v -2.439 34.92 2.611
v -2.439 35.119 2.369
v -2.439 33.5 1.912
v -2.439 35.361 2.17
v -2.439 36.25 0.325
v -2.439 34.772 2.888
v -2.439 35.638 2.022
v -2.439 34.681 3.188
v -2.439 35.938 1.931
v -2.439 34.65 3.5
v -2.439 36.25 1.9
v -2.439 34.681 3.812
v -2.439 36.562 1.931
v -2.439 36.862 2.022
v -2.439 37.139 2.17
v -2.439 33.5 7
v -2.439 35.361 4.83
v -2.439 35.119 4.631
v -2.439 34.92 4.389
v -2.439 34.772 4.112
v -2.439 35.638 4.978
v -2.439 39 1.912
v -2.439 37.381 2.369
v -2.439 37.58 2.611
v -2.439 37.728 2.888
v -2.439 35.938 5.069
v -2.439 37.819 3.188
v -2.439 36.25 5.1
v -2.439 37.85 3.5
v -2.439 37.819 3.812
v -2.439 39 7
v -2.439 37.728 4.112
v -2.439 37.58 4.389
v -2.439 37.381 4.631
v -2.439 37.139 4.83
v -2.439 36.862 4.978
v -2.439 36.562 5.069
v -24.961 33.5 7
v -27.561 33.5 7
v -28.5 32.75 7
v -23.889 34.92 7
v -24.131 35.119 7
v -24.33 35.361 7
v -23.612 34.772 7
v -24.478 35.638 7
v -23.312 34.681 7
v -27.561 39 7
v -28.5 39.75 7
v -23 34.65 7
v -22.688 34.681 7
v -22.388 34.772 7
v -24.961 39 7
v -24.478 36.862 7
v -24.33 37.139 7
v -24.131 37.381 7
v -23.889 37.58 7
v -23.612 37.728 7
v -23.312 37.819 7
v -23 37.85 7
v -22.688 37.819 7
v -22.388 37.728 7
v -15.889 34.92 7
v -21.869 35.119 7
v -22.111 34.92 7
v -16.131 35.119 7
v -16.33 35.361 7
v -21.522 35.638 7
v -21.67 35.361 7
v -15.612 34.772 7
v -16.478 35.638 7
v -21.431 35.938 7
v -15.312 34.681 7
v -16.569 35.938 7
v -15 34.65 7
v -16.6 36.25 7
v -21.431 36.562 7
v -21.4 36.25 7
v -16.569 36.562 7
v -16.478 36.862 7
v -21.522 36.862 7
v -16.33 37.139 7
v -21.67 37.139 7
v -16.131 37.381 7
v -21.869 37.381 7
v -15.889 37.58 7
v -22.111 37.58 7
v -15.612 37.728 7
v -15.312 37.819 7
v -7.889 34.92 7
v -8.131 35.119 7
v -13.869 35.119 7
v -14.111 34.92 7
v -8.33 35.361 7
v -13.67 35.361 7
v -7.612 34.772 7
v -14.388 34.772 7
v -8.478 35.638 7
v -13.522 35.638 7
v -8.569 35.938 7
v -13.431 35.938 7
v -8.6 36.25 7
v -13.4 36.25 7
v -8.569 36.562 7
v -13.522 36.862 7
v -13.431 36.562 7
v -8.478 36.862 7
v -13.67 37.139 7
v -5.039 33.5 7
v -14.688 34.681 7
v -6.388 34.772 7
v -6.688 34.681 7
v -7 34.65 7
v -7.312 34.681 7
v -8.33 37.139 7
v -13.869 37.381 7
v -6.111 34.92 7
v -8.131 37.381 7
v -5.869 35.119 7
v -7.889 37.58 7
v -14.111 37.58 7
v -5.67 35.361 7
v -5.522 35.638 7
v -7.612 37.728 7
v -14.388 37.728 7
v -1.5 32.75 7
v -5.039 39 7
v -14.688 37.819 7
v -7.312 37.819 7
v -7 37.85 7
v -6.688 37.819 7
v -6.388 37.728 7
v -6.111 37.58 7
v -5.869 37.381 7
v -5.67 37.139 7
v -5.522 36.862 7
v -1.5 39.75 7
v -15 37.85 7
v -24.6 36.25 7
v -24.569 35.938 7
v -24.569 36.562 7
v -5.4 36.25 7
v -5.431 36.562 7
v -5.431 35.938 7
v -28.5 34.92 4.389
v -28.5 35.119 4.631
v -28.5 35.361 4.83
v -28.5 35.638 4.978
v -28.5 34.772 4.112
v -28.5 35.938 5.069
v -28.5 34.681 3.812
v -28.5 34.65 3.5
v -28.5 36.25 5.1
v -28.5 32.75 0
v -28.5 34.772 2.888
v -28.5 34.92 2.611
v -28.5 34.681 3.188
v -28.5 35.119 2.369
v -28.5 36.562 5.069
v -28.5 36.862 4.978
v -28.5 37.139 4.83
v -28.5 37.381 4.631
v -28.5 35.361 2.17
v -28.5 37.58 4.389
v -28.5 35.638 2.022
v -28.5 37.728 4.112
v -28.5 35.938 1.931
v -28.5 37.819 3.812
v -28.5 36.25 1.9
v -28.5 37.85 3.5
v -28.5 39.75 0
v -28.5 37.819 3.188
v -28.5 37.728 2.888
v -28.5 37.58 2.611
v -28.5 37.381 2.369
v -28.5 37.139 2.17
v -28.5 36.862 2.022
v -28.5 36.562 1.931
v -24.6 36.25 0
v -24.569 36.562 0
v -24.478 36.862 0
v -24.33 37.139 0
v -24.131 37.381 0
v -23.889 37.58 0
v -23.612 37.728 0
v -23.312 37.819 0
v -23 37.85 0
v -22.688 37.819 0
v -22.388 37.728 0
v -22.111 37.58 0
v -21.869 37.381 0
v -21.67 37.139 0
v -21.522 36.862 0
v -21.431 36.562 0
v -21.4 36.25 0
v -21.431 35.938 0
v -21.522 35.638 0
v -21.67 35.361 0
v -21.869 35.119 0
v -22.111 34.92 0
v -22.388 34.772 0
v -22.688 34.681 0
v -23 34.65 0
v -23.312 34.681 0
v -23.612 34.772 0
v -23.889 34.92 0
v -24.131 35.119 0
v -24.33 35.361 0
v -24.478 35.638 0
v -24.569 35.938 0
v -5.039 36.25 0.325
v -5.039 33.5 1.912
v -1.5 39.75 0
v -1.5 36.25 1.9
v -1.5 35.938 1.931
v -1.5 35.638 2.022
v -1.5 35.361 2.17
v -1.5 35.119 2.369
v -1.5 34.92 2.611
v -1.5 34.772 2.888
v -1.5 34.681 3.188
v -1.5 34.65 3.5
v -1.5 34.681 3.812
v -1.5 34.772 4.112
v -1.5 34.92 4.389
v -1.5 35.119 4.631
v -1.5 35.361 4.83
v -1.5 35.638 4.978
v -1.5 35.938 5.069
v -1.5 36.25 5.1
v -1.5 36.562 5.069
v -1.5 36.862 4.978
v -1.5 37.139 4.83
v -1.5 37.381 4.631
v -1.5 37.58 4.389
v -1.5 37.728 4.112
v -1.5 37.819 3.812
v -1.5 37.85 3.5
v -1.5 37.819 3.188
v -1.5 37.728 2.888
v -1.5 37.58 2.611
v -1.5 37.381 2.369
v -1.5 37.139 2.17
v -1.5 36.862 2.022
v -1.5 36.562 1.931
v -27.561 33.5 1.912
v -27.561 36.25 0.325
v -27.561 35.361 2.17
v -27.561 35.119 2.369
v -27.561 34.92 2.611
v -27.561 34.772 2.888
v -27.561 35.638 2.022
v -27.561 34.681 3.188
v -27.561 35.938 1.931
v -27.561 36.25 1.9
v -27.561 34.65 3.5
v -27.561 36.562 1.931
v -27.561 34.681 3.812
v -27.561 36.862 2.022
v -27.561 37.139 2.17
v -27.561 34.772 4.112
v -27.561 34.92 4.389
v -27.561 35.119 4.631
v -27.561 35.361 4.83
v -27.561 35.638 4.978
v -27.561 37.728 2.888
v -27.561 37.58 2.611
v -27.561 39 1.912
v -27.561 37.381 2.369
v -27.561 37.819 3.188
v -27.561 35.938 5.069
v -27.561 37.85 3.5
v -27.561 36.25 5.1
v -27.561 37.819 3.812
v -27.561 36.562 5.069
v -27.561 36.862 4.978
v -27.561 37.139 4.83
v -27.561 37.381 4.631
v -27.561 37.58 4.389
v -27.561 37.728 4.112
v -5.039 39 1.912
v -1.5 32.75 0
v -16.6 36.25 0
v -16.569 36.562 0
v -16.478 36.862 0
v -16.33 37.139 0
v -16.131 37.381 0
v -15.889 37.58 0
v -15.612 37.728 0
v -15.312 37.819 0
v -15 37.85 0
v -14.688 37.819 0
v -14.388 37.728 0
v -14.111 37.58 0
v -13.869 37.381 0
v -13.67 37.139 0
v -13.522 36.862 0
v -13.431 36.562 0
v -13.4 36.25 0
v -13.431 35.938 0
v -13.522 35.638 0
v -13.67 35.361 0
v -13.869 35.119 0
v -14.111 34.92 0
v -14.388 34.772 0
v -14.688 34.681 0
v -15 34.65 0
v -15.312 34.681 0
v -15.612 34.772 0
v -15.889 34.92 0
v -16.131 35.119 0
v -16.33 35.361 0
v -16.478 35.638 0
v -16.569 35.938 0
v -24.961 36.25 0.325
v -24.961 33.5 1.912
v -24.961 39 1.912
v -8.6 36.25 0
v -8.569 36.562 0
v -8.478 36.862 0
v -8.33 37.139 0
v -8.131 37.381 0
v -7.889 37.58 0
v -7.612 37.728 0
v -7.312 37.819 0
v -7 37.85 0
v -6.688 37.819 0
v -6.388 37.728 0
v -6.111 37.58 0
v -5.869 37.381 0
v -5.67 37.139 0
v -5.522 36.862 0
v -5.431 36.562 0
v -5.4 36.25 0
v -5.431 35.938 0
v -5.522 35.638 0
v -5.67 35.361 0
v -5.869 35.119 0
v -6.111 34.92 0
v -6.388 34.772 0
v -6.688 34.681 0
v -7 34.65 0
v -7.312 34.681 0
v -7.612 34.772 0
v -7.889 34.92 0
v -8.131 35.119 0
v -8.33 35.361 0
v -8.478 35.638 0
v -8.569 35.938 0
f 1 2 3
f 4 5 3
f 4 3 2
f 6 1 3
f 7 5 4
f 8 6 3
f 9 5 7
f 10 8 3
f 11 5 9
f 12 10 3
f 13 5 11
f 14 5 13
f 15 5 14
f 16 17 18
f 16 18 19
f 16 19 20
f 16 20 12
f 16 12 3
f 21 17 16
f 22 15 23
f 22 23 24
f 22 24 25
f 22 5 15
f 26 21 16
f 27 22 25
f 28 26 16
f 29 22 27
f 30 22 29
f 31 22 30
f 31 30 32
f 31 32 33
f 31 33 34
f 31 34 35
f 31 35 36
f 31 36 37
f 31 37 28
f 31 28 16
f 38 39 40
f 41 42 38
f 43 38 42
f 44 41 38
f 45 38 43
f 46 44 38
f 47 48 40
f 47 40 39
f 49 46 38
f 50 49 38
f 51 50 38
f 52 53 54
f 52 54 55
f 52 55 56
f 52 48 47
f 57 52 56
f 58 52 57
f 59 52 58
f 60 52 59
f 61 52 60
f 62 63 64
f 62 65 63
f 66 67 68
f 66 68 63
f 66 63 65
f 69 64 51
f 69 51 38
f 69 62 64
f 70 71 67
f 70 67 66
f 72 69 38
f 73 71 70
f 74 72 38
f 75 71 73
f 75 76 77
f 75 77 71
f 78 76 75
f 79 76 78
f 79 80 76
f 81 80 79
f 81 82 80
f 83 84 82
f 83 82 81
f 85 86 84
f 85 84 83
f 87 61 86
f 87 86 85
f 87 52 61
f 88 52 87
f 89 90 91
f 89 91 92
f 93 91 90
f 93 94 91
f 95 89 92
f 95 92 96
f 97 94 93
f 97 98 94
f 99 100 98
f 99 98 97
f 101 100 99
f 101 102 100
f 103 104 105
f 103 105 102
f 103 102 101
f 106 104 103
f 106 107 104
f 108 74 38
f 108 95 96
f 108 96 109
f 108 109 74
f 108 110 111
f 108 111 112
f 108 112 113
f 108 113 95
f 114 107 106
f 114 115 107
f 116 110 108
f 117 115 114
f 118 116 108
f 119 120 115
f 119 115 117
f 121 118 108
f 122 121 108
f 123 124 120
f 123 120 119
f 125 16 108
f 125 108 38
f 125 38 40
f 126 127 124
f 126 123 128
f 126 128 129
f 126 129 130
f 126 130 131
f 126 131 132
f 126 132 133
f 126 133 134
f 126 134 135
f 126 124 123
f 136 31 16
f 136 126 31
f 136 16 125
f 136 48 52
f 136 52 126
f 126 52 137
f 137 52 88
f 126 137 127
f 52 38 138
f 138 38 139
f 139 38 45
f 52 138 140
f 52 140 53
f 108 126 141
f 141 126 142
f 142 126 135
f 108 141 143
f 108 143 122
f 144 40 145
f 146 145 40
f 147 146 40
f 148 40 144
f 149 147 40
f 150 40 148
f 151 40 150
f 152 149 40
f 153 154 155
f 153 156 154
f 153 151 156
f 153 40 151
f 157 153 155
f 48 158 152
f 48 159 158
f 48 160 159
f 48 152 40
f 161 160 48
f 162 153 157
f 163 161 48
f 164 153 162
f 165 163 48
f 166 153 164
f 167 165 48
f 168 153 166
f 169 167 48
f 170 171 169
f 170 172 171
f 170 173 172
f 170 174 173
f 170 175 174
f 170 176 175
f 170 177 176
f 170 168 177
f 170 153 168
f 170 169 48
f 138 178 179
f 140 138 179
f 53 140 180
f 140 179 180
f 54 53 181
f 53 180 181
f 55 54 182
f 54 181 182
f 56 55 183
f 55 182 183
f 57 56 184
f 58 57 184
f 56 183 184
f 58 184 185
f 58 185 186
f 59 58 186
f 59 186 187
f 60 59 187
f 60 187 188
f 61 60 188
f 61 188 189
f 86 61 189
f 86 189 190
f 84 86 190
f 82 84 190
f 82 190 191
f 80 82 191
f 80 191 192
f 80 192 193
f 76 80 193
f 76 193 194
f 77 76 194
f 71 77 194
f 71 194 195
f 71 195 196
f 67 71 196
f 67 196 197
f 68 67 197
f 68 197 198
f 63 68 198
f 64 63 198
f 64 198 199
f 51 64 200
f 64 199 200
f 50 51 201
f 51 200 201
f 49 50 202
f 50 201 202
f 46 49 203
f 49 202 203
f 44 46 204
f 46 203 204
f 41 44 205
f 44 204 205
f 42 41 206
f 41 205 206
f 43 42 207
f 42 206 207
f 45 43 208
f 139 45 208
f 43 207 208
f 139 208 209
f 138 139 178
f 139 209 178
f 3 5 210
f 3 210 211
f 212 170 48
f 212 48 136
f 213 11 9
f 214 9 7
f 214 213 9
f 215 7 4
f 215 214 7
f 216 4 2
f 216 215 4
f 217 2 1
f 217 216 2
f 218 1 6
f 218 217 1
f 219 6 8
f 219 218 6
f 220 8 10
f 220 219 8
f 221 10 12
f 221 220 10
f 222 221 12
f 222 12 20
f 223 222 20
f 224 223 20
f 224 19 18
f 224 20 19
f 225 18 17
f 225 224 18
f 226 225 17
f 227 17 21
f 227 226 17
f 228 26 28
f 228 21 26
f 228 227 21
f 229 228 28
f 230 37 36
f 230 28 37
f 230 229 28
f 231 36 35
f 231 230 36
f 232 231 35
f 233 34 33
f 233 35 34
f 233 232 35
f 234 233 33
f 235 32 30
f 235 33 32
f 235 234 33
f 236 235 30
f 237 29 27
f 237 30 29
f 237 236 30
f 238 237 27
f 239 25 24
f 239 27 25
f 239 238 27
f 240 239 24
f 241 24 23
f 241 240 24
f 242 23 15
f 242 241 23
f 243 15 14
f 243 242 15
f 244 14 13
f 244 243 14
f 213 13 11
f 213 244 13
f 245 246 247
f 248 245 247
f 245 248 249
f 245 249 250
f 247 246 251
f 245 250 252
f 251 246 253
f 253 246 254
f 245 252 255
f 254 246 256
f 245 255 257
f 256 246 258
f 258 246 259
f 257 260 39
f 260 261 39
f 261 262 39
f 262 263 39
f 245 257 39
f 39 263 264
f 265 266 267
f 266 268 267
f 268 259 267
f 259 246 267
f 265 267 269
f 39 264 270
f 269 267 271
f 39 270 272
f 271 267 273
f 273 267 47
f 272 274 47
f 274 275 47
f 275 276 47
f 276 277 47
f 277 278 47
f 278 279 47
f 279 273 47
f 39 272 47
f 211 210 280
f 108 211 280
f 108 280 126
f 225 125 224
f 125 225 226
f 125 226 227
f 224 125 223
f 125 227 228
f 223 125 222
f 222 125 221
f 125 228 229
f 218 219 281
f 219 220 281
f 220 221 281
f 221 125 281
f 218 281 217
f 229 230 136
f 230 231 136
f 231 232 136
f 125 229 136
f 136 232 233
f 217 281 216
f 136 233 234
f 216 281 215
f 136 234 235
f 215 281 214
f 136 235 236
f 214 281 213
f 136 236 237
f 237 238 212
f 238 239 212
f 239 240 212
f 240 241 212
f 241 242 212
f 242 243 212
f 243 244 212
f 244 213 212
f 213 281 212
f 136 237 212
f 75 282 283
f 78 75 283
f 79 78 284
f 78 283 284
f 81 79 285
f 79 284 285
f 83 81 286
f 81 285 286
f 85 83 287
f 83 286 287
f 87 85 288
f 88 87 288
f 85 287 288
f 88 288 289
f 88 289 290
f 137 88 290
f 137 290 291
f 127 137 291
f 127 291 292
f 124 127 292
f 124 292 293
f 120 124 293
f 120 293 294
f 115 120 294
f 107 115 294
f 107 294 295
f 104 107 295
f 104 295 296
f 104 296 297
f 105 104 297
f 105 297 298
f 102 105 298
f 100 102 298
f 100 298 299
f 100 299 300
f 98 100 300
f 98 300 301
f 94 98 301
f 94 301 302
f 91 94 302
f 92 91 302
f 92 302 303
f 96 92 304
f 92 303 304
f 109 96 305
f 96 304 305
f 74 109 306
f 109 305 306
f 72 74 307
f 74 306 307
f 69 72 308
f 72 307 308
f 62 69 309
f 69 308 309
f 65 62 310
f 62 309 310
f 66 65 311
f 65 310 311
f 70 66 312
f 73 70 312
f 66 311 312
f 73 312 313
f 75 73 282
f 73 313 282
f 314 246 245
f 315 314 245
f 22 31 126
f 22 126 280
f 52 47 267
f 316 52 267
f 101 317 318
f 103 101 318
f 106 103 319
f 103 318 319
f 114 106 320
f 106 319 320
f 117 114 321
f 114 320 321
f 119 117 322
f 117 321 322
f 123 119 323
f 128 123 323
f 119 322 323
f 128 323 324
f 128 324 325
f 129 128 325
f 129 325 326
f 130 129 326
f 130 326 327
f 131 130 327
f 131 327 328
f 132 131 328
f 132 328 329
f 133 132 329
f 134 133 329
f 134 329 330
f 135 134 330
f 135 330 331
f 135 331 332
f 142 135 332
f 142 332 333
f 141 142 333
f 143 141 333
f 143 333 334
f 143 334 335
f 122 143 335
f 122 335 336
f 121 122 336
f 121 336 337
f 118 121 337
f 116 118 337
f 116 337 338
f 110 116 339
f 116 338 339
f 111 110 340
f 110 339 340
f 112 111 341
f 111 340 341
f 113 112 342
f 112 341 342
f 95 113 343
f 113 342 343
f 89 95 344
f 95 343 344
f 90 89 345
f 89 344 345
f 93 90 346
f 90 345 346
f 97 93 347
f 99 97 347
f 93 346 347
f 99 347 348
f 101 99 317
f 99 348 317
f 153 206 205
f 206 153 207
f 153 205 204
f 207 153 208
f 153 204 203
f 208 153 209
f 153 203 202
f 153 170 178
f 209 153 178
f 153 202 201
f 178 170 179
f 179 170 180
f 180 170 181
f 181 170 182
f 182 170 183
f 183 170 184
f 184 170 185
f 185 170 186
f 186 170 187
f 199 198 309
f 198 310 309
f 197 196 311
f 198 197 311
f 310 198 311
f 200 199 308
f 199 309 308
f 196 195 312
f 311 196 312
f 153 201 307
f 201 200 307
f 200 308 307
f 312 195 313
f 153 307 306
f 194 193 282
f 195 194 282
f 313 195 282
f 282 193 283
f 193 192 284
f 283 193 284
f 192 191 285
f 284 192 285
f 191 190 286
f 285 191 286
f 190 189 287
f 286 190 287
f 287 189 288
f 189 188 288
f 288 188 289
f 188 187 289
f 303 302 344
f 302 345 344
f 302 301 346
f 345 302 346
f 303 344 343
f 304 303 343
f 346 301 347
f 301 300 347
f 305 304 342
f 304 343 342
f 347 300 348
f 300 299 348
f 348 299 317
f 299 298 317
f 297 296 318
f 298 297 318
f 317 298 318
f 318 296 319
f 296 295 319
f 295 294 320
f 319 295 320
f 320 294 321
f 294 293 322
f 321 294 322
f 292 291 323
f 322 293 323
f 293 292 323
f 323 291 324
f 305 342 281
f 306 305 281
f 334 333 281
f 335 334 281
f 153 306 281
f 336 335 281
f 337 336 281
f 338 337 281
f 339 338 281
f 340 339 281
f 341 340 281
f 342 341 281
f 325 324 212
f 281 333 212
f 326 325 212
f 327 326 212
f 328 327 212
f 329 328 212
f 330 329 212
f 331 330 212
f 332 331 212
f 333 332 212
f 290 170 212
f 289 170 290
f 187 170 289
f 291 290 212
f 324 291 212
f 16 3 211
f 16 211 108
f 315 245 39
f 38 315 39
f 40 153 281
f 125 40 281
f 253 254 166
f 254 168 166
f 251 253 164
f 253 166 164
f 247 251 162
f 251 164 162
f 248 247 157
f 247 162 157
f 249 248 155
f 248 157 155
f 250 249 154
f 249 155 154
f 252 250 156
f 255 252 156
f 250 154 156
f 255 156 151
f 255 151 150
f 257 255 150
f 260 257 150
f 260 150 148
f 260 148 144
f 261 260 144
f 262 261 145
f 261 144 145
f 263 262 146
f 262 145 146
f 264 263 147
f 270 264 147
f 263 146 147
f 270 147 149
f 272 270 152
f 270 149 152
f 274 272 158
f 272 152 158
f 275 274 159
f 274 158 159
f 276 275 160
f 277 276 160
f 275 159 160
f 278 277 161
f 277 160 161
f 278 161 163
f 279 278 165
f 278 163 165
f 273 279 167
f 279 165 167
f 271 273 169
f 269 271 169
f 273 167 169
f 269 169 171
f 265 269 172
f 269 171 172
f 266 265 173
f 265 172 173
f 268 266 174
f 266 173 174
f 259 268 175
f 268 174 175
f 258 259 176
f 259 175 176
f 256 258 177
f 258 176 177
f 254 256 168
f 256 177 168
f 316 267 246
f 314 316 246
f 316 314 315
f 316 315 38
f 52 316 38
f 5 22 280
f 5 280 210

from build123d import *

# Parameters (mm, degrees)
SKETCH1_W                      = 27
SKETCH1_H                      = 7
BOSS_EXTRUDE1_DEPTH            = 7
SIDE_SHAFT_HOLES_M3_AT_2_COUNT = 2
SIDE_SHAFT_HOLES_M3_AT_2_PITCH = 48.812875198
SKETCH9_R                      = 1.6
BOSS_EXTRUDE2_DEPTH            = 3.4
M3_CLEARANCE_HOLE1_D           = 3.2
CUT_EXTRUDE1_START             = -2.1
CUT_EXTRUDE1_DEPTH             = 2.6


with BuildPart() as part:
    # Sketch1 → Boss-Extrude1 (new body)
    with BuildSketch(Plane.XY):
        with Locations((-15, 36.25)):
            Rectangle(SKETCH1_W, SKETCH1_H)
    extrude(amount=BOSS_EXTRUDE1_DEPTH)

    # Sketch2 → Side Shaft Holes (M3) (revolve, cut)
    with BuildSketch(Plane(origin=(-1.5, 36.25, 3.5), x_dir=(0, 0, -1), z_dir=(0, 1, 0))):
        Polygon((0, 0), (0, 4), (1.6, 3.03862301), (1.6, 0), align=None)
    side_shaft_holes_m3 = revolve(axis=Axis((4.85, 36.25, 3.5), (-1, 0, 0)), mode=Mode.SUBTRACT)

    # Side Shaft Holes (M3) at 2: Side Shaft Holes (M3) ×2
    with Locations(*[(0, 0, -i * SIDE_SHAFT_HOLES_M3_AT_2_PITCH) for i in range(1, SIDE_SHAFT_HOLES_M3_AT_2_COUNT)]):
        add(side_shaft_holes_m3, mode=Mode.SUBTRACT)

    # Sketch9 → Boss-Extrude2 (add)
    with BuildSketch(Plane.ZY.offset(4.53862301)):
        with Locations(Location((3.5, 36.25, 0), (0, 0, 180))):
            Circle(SKETCH9_R)
    boss_extrude2 = extrude(amount=BOSS_EXTRUDE2_DEPTH)

    # Shaft Hole Mirror: Side Shaft Holes (M3), Boss-Extrude2 across plane
    add(side_shaft_holes_m3.mirror(Plane.ZY.offset(15)), mode=Mode.SUBTRACT)
    add(boss_extrude2.mirror(Plane.ZY.offset(15)))

    # Shaft Hole Mirror copy 1 sketch → Shaft Hole Mirror copy 1 (revolve, cut)
    with BuildSketch(Plane(origin=(-28.5, 36.25, -45.312875198), x_dir=(0, 0, -1), z_dir=(0, 1, 0))):
        Polygon((0, 0), (0, -4), (1.6, -3.03862301), (1.6, 0), align=None)
    revolve(axis=Axis((-34.85, 36.25, -45.312875198), (-1, 0, 0)), mode=Mode.SUBTRACT)

    # M3 Clearance Hole1 (through all)
    with Locations(Plane.XY.offset(7)):
        with Locations((-7, 36.25), (-15, 36.25), (-23, 36.25)):
            Hole(M3_CLEARANCE_HOLE1_D / 2)

    # Sketch8 → Cut-Extrude1 (cut)
    with BuildSketch(Plane.ZY.offset(4.53862301).offset(CUT_EXTRUDE1_START)):
        Polygon((0.324573519, 36.25), (1.91228676, 33.5), (5.08771324, 33.5), (7, 33.5), (7, 39), (5.08771324, 39), (1.91228676, 39), align=None)
    cut_extrude1 = extrude(amount=CUT_EXTRUDE1_DEPTH, mode=Mode.SUBTRACT)

    # Mirror1: Cut-Extrude1 across plane
    add(cut_extrude1.mirror(Plane.ZY.offset(15)), mode=Mode.SUBTRACT)


solid = part.part
